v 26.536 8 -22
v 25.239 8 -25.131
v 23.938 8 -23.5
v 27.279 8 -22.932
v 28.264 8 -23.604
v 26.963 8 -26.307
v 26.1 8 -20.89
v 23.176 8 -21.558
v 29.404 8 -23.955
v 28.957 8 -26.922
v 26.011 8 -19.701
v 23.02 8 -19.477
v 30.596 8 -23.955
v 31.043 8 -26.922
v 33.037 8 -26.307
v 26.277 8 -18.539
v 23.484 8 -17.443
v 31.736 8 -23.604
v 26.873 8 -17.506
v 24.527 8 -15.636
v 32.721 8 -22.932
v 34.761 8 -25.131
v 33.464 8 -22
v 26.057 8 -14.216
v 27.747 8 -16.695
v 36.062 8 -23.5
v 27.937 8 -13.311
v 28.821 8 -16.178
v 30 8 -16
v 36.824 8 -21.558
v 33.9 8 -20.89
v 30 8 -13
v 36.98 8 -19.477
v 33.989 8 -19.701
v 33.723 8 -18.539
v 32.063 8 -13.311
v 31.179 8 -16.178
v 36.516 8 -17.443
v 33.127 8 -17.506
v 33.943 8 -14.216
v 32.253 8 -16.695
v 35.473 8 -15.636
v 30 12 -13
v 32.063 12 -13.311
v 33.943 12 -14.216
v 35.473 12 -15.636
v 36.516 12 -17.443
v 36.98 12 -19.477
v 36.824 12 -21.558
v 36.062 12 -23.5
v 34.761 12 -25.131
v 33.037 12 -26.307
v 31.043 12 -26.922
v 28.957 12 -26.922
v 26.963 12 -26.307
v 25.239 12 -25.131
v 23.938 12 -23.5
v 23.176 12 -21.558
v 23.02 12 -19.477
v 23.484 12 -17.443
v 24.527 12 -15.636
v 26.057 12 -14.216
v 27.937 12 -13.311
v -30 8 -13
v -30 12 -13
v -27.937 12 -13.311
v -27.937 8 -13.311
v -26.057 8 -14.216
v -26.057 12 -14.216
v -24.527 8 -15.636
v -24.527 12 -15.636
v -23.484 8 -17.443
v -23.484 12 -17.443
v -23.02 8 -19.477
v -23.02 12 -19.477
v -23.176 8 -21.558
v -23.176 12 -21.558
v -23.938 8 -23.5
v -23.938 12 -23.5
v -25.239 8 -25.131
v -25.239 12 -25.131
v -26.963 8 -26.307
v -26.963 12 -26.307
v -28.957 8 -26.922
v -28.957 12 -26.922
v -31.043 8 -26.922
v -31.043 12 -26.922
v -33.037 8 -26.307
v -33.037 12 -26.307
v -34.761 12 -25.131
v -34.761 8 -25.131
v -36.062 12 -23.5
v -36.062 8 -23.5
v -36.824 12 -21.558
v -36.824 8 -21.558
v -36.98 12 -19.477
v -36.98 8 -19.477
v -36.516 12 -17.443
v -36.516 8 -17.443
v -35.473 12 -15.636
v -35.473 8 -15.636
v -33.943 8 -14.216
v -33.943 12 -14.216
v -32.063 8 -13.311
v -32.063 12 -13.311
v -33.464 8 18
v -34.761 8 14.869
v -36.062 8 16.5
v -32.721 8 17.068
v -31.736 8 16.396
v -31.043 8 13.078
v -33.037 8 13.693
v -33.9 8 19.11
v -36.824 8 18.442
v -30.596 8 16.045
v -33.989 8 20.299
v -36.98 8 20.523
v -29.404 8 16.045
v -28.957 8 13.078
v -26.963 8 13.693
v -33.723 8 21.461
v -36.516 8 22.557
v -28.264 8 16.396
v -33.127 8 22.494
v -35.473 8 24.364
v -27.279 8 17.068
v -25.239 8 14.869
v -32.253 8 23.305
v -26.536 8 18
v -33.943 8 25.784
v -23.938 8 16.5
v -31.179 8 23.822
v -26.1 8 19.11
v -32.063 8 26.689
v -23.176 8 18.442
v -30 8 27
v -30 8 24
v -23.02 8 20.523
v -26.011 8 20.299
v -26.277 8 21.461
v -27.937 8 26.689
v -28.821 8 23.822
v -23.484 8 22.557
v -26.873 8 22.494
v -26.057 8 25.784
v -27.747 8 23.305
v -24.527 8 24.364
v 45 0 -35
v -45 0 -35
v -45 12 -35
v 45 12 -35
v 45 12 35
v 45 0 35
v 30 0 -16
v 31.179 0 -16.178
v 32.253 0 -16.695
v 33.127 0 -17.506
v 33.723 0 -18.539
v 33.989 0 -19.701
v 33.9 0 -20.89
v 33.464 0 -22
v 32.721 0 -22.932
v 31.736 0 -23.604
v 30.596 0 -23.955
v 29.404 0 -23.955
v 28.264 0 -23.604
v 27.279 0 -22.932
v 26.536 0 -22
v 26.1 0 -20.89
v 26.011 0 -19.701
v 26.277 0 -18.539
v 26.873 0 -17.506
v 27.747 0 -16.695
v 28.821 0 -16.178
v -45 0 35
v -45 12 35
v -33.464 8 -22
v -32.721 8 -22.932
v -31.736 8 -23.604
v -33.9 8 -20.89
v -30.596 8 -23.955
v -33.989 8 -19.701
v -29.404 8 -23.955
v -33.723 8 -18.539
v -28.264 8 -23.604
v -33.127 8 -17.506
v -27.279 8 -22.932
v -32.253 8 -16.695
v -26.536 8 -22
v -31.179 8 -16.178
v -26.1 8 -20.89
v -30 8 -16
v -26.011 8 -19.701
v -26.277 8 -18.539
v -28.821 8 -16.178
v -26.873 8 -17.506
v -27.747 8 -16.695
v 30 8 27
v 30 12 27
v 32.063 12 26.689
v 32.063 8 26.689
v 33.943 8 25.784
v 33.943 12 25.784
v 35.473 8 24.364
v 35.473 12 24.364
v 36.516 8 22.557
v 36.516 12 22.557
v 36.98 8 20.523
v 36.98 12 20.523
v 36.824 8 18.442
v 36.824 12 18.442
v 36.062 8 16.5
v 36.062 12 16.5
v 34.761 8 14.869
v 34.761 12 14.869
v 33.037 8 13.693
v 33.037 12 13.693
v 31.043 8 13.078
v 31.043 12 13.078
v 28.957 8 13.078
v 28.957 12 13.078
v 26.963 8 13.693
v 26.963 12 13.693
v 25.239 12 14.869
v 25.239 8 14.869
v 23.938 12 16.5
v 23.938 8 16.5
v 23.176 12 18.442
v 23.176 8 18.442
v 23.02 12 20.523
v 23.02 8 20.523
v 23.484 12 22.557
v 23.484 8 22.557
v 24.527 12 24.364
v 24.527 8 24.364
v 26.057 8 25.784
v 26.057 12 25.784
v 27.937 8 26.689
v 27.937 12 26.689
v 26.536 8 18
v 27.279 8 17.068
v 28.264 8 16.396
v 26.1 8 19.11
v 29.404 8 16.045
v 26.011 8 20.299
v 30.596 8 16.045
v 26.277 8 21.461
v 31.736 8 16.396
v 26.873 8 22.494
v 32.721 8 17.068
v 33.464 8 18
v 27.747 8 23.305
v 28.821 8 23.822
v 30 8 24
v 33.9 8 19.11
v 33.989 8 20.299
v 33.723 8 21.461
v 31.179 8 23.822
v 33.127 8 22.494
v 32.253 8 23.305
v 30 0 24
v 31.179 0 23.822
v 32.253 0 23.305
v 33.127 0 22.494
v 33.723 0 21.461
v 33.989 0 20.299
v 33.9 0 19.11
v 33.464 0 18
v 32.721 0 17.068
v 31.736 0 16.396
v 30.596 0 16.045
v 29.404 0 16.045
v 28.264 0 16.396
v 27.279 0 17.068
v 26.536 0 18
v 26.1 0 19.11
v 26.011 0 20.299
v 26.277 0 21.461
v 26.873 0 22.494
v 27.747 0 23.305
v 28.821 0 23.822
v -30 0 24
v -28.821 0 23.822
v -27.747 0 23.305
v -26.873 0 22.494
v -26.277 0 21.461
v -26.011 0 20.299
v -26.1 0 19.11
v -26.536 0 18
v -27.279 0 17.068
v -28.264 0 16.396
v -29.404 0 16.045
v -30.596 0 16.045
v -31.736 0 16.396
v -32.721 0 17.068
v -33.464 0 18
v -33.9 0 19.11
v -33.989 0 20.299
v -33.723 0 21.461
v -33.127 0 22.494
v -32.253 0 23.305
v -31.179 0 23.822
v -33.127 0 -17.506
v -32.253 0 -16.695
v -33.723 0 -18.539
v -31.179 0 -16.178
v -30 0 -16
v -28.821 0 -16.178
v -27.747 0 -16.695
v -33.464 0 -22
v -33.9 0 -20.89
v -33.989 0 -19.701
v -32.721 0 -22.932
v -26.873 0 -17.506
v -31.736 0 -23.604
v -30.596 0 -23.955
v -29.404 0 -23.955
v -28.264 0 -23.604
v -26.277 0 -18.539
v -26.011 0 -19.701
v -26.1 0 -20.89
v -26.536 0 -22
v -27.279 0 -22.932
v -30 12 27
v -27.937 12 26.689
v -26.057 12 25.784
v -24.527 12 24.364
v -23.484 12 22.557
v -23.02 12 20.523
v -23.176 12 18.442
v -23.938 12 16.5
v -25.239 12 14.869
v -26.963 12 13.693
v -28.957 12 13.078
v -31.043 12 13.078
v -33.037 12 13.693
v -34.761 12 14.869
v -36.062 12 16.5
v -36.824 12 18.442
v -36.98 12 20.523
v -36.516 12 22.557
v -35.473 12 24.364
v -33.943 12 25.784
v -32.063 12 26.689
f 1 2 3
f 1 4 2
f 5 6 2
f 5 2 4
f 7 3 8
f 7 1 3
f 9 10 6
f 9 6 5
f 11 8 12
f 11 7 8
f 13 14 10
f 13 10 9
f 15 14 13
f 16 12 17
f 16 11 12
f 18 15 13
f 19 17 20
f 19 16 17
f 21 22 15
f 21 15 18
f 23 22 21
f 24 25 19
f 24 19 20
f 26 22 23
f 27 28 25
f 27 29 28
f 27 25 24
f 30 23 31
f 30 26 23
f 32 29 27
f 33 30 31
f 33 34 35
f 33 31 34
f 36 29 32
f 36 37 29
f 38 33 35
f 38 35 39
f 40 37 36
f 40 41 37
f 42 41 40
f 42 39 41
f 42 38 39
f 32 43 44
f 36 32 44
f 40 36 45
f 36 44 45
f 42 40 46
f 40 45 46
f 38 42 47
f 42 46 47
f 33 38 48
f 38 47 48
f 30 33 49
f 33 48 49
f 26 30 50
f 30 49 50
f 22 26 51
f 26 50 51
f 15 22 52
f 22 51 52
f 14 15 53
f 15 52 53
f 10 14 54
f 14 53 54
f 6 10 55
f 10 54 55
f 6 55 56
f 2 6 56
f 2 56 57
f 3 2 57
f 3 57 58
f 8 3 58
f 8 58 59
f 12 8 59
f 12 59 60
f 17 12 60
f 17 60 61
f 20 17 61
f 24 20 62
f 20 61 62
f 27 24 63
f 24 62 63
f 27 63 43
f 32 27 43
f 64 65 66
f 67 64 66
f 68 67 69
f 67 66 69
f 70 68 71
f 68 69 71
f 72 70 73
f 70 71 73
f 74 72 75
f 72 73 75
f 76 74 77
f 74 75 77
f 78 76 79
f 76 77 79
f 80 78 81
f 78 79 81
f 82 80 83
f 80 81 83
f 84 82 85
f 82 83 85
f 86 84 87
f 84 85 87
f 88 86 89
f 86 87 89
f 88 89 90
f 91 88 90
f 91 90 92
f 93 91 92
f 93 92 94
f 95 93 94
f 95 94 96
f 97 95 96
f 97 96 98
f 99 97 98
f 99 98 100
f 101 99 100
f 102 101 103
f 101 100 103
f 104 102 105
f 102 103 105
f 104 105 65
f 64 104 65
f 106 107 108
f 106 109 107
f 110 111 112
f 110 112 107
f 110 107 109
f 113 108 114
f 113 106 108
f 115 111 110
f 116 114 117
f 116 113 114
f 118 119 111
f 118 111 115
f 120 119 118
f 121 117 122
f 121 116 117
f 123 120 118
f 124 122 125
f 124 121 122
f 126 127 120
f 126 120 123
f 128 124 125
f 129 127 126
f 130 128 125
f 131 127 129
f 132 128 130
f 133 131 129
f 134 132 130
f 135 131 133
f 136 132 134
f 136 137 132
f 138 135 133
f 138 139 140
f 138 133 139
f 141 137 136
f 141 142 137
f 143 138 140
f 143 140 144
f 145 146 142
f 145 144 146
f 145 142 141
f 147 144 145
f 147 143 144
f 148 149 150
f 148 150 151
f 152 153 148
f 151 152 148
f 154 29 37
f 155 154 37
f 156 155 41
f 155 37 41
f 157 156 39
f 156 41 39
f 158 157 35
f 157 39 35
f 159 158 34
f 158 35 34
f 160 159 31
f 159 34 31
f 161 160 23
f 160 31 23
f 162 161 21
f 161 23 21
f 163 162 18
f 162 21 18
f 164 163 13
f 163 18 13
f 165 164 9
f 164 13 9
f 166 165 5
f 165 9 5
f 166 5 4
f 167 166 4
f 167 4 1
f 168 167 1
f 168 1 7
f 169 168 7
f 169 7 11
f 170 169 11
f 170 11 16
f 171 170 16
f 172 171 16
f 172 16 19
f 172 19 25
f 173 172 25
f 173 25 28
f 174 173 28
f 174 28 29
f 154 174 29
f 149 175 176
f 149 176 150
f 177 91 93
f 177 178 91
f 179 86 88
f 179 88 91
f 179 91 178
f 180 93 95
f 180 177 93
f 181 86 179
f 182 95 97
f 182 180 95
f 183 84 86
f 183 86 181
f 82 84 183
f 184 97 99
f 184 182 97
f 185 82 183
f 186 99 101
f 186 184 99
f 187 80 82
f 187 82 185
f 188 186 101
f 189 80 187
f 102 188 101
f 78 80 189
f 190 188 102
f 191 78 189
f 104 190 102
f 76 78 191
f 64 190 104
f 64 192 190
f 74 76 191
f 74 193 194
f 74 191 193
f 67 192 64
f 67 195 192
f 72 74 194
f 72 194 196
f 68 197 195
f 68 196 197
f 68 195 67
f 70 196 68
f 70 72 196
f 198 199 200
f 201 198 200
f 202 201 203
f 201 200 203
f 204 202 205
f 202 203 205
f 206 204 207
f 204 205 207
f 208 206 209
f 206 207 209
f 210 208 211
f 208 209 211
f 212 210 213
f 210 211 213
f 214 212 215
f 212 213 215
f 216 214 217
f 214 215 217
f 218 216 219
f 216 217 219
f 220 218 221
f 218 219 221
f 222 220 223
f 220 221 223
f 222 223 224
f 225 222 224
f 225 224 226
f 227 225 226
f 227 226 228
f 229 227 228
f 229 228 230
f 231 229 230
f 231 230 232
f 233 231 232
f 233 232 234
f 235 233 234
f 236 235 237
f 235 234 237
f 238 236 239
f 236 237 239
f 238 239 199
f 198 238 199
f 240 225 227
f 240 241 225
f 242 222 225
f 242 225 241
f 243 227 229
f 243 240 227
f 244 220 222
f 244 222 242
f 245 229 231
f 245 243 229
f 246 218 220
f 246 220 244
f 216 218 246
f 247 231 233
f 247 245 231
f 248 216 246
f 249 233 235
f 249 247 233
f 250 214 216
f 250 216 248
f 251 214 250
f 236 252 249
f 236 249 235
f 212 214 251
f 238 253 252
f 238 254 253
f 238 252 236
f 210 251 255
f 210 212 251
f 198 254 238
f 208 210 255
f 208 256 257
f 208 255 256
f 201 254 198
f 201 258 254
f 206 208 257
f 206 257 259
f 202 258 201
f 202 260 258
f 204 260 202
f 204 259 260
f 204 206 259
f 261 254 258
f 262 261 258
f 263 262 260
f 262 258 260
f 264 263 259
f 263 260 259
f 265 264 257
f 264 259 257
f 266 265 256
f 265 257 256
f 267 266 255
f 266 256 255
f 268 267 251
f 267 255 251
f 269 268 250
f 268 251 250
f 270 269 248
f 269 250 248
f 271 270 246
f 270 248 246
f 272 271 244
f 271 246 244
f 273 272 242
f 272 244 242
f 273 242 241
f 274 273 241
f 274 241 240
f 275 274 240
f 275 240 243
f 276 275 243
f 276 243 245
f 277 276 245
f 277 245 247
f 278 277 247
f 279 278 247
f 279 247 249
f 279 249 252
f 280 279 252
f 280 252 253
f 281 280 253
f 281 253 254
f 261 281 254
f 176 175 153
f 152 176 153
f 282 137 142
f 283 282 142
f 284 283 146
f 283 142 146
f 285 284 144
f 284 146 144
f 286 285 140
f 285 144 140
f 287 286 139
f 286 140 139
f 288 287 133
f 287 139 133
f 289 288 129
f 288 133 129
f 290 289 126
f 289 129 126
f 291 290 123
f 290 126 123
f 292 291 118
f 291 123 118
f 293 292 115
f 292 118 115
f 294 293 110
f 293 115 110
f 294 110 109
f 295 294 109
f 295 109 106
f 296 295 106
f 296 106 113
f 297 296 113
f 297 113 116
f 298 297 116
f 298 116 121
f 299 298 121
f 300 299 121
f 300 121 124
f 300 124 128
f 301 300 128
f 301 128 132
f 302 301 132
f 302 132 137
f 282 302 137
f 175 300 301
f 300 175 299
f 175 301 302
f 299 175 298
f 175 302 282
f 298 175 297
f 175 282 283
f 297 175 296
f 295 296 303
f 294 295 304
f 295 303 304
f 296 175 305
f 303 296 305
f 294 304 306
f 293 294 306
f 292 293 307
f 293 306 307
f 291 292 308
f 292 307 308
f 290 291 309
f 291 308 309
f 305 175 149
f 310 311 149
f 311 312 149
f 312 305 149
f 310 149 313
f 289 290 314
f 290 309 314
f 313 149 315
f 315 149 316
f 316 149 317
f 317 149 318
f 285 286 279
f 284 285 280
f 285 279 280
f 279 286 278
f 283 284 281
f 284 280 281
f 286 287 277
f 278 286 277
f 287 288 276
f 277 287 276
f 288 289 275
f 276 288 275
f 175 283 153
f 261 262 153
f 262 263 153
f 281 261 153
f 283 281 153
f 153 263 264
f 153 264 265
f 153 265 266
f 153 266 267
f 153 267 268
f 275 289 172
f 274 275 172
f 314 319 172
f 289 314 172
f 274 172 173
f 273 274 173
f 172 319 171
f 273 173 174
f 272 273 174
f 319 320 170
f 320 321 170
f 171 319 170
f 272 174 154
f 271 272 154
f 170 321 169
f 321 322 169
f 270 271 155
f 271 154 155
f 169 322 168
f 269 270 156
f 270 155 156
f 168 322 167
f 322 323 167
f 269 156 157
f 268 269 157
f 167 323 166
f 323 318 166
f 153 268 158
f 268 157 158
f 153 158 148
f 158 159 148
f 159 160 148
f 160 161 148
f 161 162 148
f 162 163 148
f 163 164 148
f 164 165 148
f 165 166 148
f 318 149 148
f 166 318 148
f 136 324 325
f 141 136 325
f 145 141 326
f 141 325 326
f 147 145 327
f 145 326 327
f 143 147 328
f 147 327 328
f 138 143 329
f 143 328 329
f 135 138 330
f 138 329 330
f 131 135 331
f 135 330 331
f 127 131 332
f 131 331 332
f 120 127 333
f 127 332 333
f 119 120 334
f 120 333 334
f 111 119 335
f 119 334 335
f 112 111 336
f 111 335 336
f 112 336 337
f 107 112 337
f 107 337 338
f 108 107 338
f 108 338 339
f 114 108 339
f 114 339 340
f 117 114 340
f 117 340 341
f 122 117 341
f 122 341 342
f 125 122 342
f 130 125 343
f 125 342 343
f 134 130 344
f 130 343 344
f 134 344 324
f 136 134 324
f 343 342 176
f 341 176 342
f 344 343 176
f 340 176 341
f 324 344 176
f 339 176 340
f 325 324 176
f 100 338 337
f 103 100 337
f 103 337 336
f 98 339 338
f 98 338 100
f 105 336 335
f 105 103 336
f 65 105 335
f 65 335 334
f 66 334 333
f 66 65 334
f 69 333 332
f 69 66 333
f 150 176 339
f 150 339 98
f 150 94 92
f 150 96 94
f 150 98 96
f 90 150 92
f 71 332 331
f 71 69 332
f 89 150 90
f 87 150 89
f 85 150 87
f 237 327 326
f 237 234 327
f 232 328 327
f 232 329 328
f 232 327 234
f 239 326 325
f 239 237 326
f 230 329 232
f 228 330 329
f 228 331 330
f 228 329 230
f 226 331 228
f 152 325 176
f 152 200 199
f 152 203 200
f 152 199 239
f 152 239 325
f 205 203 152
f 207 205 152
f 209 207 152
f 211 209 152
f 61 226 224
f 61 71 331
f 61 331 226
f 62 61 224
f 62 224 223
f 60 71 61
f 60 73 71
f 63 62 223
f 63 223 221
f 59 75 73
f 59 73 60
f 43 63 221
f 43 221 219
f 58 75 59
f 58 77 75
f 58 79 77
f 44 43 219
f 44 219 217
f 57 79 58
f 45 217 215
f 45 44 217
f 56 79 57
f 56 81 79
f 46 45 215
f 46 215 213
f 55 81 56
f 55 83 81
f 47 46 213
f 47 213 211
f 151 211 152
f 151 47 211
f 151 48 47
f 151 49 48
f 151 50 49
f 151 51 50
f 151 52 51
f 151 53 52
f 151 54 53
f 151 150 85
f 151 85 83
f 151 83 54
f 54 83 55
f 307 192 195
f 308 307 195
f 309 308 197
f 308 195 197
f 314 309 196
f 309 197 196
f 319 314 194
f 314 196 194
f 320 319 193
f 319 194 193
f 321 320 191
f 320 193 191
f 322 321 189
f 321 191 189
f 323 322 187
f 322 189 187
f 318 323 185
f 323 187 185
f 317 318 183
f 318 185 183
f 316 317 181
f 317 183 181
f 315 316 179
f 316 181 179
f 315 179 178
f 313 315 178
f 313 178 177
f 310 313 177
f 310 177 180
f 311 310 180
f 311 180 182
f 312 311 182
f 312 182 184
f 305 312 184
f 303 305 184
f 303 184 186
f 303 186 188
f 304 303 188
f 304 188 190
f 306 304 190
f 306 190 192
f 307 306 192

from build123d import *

# Parameters (mm, degrees)
SKETCH_1_W          = 90
SKETCH_1_H          = 70
EXTRUDE_1_DEPTH     = 12
SKETCH_2_R          = 7
CUT_EXTRUDE_1_DEPTH = 4
SKETCH_3_R          = 4
CUT_EXTRUDE_2_DEPTH = 59.258046655


with BuildPart() as part:
    # 草图1 → 凸台-拉伸1 (new body)
    with BuildSketch(Plane(origin=(0, 0, 0), x_dir=(1, 0, 0), z_dir=(0, 1, 0))):
        Rectangle(SKETCH_1_W, SKETCH_1_H)
    extrude(amount=EXTRUDE_1_DEPTH)

    # 草图2 → 切除-拉伸1 (cut)
    with BuildSketch(Plane(origin=(0, 12, 0), x_dir=(1, 0, 0), z_dir=(0, 1, 0))):
        with Locations(Location((-30, 20, 0), (0, 0, 270))):
            Circle(SKETCH_2_R)
        with Locations(Location((30, 20, 0), (0, 0, 270))):
            Circle(SKETCH_2_R)
        with Locations(Location((-30, -20, 0), (0, 0, 270))):
            Circle(SKETCH_2_R)
        with Locations(Location((30, -20, 0), (0, 0, 270))):
            Circle(SKETCH_2_R)
    extrude(amount=-CUT_EXTRUDE_1_DEPTH, mode=Mode.SUBTRACT)

    # 草图3 → 切除-拉伸2 (cut, through all)
    with BuildSketch(Plane(origin=(0, 12, 0), x_dir=(1, 0, 0), z_dir=(0, 1, 0))):
        with Locations(Location((-30, 20, 0), (0, 0, 270))):
            Circle(SKETCH_3_R)
        with Locations(Location((30, 20, 0), (0, 0, 270))):
            Circle(SKETCH_3_R)
        with Locations(Location((-30, -20, 0), (0, 0, 270))):
            Circle(SKETCH_3_R)
        with Locations(Location((30, -20, 0), (0, 0, 270))):
            Circle(SKETCH_3_R)
    extrude(amount=-CUT_EXTRUDE_2_DEPTH, mode=Mode.SUBTRACT)


solid = part.part
